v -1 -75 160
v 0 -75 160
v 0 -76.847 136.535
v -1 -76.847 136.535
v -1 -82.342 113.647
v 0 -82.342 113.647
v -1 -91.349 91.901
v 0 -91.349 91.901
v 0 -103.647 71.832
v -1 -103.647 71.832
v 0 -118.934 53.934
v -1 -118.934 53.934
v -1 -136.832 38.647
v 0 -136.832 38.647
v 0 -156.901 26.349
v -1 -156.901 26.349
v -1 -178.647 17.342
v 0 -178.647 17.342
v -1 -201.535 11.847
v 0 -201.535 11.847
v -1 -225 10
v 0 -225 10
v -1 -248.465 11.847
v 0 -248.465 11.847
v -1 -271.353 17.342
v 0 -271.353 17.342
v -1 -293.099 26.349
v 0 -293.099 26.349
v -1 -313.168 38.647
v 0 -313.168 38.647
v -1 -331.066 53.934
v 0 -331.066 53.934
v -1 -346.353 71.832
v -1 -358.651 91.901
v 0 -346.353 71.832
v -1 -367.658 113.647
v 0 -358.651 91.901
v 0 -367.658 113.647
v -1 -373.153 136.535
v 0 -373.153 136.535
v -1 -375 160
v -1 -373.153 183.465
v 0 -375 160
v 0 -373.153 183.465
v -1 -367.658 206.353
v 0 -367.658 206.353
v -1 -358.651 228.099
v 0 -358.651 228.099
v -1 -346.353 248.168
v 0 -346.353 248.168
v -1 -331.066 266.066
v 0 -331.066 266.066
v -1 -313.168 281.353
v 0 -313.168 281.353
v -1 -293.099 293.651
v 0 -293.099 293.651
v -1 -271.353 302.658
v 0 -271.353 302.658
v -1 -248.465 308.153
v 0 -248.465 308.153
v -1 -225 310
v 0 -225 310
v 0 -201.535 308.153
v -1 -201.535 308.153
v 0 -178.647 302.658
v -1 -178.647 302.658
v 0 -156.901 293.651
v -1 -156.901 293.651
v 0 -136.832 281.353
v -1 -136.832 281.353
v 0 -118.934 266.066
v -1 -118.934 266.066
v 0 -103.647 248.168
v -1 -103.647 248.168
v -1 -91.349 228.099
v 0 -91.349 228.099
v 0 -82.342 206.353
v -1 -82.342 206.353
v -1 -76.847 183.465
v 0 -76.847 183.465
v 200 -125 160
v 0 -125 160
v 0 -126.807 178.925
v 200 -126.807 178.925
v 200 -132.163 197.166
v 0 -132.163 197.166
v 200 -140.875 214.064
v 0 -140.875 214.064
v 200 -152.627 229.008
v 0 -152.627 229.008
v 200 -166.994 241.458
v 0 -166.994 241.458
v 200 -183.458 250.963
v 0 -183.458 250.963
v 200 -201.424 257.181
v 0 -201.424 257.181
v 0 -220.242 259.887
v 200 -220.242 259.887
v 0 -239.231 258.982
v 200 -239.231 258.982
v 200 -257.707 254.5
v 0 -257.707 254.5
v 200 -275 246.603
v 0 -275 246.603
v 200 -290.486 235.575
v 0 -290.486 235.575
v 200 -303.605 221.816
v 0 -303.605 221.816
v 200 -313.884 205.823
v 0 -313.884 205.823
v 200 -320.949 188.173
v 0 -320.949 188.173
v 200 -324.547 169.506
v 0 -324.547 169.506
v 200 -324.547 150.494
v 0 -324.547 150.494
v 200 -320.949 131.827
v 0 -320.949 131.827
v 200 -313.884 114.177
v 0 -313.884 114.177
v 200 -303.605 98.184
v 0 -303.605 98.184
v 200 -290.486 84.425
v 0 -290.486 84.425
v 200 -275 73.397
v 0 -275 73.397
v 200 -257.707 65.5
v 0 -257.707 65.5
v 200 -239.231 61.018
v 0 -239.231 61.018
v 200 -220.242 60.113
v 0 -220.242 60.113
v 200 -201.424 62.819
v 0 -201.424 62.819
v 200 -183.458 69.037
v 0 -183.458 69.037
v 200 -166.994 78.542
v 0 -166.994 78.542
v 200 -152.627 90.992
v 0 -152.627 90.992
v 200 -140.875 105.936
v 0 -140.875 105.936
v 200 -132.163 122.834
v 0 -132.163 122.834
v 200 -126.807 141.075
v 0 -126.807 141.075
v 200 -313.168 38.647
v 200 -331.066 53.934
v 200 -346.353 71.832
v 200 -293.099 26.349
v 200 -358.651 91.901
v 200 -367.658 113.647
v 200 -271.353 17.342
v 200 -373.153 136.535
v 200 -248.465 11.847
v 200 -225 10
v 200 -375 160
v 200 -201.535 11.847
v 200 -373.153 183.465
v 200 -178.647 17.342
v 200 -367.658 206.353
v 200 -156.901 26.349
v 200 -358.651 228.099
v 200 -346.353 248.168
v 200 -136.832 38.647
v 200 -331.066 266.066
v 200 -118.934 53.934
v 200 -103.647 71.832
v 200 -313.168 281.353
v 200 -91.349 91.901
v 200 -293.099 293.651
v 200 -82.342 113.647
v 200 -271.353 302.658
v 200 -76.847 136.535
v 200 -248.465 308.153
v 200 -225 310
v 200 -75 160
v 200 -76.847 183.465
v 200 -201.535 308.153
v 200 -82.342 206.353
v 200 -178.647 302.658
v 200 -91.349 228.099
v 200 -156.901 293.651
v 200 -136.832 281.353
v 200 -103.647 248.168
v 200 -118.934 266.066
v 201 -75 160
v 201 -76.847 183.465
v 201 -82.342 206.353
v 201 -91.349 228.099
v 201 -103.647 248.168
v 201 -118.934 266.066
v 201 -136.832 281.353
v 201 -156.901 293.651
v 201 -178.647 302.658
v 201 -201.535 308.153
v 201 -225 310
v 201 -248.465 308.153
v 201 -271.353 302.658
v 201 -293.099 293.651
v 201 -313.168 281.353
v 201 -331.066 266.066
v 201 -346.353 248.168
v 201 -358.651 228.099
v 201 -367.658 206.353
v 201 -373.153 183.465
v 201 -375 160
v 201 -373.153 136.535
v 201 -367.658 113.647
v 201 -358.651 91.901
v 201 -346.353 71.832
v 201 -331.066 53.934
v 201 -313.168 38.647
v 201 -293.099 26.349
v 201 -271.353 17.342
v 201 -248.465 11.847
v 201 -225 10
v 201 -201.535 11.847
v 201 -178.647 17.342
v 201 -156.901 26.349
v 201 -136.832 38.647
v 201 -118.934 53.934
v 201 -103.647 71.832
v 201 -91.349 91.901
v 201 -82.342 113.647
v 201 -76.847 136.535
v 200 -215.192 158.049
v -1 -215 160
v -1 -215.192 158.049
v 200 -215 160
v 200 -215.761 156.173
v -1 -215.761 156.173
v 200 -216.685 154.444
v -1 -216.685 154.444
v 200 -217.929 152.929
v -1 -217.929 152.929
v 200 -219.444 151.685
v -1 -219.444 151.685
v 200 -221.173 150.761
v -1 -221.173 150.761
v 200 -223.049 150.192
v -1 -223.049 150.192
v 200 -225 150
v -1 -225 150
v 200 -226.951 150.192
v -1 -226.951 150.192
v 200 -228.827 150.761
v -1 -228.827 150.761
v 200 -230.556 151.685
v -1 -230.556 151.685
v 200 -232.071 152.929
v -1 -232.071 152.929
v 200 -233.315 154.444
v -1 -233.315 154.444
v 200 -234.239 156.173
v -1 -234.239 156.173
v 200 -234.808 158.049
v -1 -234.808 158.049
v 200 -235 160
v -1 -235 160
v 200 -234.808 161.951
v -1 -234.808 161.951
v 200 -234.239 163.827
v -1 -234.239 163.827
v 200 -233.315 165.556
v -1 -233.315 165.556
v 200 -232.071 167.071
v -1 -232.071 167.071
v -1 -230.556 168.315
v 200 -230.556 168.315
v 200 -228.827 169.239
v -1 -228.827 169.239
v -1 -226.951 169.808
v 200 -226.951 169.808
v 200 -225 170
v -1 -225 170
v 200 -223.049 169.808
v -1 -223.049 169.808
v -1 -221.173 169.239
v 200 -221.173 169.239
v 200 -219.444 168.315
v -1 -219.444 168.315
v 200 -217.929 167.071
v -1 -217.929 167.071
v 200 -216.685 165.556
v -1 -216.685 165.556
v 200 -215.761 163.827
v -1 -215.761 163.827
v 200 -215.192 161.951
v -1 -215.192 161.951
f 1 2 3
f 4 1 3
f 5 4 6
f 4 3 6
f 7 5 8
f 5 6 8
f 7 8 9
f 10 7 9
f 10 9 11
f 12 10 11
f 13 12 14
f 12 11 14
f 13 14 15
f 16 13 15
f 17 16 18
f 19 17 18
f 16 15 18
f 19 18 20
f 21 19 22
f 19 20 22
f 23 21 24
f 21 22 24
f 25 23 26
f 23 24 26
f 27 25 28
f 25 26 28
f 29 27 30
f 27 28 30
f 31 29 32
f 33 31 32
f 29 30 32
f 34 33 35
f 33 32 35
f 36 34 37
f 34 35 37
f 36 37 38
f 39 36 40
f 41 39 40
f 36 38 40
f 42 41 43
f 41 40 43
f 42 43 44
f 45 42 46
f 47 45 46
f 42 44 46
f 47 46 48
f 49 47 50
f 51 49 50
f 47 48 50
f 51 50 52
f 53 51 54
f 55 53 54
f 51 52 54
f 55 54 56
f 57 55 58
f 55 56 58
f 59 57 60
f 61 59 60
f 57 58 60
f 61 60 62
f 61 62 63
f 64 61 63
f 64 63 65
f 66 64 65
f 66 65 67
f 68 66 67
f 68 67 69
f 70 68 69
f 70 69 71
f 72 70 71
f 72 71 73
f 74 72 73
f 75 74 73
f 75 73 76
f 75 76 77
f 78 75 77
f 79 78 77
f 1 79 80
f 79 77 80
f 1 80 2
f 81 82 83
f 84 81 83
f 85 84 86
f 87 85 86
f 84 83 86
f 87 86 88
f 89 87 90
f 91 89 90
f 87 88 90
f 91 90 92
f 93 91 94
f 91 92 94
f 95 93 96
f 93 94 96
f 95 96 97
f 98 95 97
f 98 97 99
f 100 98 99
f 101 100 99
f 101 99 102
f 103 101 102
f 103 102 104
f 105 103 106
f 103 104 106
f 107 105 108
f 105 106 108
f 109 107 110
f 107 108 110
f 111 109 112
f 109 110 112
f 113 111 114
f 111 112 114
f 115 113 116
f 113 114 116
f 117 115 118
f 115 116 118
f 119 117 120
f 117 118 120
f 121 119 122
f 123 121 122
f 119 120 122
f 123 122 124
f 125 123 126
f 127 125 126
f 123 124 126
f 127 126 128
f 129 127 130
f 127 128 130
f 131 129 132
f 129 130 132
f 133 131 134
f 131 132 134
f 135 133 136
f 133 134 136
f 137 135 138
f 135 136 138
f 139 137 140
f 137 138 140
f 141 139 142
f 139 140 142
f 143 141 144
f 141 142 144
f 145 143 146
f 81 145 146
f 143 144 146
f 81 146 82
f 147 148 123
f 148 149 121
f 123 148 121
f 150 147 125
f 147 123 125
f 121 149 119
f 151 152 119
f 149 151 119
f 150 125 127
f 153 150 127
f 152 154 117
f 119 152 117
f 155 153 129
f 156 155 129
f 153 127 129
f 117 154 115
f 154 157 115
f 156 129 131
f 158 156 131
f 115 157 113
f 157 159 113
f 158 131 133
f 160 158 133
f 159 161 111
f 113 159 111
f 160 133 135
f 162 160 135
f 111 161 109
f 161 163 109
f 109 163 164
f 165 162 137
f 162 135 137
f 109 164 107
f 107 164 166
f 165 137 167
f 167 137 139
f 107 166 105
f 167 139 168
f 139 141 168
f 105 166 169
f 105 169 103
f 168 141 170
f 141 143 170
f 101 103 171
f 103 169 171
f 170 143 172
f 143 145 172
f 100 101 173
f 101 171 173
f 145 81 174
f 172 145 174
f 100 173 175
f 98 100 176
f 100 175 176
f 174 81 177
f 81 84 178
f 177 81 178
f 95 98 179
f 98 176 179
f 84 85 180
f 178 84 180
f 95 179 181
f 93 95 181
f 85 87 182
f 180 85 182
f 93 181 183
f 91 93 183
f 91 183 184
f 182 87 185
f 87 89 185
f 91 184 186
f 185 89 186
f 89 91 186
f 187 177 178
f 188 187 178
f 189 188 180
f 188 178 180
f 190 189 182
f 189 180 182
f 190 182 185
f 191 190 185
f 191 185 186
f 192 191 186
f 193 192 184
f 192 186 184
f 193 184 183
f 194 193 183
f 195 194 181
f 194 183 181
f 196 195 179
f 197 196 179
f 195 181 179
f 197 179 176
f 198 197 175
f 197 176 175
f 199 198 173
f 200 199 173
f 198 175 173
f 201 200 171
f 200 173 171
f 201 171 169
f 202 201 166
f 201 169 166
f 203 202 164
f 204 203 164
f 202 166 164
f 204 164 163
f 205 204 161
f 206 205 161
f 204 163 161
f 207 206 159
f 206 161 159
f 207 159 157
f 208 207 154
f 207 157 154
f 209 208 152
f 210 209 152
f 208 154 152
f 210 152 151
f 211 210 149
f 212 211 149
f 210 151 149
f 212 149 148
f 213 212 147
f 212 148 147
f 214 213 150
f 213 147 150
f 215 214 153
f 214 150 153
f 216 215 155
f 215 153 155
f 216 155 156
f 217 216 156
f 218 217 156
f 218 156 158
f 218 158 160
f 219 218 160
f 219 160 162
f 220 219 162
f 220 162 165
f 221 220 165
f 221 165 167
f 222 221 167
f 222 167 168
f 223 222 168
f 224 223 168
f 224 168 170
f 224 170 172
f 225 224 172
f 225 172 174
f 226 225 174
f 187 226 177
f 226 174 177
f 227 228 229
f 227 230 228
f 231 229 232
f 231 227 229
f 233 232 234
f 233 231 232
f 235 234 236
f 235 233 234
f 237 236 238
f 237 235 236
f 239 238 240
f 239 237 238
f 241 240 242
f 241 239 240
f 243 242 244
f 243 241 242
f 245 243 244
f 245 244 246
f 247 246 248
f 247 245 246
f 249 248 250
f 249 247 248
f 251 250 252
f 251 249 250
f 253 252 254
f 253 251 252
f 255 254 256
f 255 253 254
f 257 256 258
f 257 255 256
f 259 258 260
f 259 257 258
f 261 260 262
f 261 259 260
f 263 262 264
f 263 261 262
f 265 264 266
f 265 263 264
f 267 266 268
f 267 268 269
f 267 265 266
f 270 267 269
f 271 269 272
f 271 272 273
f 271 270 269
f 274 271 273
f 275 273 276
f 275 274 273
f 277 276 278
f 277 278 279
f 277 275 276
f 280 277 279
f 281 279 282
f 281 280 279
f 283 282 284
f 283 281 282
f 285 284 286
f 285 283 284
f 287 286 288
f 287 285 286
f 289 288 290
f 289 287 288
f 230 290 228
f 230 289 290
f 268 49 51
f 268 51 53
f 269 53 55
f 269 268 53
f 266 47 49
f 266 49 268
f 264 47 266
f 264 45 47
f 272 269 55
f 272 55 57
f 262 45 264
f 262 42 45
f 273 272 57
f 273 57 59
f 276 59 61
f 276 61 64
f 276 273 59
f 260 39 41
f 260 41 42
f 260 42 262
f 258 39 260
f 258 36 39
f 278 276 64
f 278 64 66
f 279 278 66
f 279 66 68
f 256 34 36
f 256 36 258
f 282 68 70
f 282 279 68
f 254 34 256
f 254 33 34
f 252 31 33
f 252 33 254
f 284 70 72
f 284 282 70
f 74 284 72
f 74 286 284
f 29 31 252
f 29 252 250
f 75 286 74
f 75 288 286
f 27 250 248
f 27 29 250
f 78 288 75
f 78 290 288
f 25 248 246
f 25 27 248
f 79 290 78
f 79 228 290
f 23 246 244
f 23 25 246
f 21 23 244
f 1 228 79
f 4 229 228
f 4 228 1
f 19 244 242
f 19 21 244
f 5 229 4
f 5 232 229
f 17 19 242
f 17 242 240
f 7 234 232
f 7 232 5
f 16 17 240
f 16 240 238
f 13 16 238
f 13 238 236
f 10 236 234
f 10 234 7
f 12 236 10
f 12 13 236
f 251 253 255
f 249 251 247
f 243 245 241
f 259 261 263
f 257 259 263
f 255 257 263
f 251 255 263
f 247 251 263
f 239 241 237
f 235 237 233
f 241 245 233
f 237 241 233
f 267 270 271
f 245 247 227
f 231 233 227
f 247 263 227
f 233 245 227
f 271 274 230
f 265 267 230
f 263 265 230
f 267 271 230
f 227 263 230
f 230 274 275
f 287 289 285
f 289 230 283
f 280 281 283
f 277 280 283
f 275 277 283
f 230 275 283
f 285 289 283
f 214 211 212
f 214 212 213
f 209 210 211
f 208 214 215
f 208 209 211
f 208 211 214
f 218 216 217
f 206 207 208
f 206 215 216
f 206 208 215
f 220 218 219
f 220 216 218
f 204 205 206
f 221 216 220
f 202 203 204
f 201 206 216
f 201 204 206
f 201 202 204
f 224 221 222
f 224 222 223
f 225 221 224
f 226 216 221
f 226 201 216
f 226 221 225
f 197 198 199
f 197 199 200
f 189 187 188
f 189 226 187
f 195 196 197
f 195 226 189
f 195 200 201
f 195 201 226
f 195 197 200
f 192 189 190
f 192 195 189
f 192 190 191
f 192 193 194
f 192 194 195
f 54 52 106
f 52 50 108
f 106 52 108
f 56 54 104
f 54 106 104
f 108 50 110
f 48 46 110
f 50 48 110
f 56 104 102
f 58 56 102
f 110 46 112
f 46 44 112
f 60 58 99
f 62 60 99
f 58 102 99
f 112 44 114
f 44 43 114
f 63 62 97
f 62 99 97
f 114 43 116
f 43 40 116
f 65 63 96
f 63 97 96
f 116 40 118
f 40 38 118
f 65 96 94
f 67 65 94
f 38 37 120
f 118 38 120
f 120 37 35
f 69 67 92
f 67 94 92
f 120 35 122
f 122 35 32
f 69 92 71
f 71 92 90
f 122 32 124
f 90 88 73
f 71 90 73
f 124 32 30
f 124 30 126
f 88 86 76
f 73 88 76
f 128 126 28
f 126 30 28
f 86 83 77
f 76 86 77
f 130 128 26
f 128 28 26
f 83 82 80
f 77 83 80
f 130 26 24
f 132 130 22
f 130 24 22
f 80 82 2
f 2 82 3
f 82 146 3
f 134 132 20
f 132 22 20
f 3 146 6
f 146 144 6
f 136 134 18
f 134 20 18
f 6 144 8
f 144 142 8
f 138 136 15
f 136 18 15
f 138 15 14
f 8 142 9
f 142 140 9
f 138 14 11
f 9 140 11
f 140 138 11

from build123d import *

# Parameters (mm, degrees)
SKETCH005_R   = 100
SKETCH005_R_2 = 10
PAD003_DEPTH  = 200
SKETCH010_R   = 150
SKETCH010_R_2 = 10
PAD007_DEPTH  = 1
SKETCH011_R   = 150
PAD008_DEPTH  = 1


with BuildPart() as part:
    # Sketch005 → Pad003 (new body)
    with BuildSketch(Plane.YZ):
        Circle(SKETCH005_R)
        Circle(SKETCH005_R_2, mode=Mode.SUBTRACT)
    extrude(amount=PAD003_DEPTH)

    # Sketch010 (on Face3 of Pad003) → Pad007 (join)
    with BuildSketch(Plane(origin=(0, 0, 0), x_dir=(0, 1, 0), z_dir=(-1, 0, 0))):
        Circle(SKETCH010_R)
        Circle(SKETCH010_R_2, mode=Mode.SUBTRACT)
    extrude(amount=PAD007_DEPTH)

    # Sketch011 (on Face3 of Pad007) → Pad008 (join)
    with BuildSketch(Plane.YZ.offset(200)):
        Circle(SKETCH011_R)
    extrude(amount=PAD008_DEPTH)


with BuildPart() as part_1:
    # Body002 placement: moved
    add(part.part.moved(Location((0, -225, 160))))


solid = part_1.part
